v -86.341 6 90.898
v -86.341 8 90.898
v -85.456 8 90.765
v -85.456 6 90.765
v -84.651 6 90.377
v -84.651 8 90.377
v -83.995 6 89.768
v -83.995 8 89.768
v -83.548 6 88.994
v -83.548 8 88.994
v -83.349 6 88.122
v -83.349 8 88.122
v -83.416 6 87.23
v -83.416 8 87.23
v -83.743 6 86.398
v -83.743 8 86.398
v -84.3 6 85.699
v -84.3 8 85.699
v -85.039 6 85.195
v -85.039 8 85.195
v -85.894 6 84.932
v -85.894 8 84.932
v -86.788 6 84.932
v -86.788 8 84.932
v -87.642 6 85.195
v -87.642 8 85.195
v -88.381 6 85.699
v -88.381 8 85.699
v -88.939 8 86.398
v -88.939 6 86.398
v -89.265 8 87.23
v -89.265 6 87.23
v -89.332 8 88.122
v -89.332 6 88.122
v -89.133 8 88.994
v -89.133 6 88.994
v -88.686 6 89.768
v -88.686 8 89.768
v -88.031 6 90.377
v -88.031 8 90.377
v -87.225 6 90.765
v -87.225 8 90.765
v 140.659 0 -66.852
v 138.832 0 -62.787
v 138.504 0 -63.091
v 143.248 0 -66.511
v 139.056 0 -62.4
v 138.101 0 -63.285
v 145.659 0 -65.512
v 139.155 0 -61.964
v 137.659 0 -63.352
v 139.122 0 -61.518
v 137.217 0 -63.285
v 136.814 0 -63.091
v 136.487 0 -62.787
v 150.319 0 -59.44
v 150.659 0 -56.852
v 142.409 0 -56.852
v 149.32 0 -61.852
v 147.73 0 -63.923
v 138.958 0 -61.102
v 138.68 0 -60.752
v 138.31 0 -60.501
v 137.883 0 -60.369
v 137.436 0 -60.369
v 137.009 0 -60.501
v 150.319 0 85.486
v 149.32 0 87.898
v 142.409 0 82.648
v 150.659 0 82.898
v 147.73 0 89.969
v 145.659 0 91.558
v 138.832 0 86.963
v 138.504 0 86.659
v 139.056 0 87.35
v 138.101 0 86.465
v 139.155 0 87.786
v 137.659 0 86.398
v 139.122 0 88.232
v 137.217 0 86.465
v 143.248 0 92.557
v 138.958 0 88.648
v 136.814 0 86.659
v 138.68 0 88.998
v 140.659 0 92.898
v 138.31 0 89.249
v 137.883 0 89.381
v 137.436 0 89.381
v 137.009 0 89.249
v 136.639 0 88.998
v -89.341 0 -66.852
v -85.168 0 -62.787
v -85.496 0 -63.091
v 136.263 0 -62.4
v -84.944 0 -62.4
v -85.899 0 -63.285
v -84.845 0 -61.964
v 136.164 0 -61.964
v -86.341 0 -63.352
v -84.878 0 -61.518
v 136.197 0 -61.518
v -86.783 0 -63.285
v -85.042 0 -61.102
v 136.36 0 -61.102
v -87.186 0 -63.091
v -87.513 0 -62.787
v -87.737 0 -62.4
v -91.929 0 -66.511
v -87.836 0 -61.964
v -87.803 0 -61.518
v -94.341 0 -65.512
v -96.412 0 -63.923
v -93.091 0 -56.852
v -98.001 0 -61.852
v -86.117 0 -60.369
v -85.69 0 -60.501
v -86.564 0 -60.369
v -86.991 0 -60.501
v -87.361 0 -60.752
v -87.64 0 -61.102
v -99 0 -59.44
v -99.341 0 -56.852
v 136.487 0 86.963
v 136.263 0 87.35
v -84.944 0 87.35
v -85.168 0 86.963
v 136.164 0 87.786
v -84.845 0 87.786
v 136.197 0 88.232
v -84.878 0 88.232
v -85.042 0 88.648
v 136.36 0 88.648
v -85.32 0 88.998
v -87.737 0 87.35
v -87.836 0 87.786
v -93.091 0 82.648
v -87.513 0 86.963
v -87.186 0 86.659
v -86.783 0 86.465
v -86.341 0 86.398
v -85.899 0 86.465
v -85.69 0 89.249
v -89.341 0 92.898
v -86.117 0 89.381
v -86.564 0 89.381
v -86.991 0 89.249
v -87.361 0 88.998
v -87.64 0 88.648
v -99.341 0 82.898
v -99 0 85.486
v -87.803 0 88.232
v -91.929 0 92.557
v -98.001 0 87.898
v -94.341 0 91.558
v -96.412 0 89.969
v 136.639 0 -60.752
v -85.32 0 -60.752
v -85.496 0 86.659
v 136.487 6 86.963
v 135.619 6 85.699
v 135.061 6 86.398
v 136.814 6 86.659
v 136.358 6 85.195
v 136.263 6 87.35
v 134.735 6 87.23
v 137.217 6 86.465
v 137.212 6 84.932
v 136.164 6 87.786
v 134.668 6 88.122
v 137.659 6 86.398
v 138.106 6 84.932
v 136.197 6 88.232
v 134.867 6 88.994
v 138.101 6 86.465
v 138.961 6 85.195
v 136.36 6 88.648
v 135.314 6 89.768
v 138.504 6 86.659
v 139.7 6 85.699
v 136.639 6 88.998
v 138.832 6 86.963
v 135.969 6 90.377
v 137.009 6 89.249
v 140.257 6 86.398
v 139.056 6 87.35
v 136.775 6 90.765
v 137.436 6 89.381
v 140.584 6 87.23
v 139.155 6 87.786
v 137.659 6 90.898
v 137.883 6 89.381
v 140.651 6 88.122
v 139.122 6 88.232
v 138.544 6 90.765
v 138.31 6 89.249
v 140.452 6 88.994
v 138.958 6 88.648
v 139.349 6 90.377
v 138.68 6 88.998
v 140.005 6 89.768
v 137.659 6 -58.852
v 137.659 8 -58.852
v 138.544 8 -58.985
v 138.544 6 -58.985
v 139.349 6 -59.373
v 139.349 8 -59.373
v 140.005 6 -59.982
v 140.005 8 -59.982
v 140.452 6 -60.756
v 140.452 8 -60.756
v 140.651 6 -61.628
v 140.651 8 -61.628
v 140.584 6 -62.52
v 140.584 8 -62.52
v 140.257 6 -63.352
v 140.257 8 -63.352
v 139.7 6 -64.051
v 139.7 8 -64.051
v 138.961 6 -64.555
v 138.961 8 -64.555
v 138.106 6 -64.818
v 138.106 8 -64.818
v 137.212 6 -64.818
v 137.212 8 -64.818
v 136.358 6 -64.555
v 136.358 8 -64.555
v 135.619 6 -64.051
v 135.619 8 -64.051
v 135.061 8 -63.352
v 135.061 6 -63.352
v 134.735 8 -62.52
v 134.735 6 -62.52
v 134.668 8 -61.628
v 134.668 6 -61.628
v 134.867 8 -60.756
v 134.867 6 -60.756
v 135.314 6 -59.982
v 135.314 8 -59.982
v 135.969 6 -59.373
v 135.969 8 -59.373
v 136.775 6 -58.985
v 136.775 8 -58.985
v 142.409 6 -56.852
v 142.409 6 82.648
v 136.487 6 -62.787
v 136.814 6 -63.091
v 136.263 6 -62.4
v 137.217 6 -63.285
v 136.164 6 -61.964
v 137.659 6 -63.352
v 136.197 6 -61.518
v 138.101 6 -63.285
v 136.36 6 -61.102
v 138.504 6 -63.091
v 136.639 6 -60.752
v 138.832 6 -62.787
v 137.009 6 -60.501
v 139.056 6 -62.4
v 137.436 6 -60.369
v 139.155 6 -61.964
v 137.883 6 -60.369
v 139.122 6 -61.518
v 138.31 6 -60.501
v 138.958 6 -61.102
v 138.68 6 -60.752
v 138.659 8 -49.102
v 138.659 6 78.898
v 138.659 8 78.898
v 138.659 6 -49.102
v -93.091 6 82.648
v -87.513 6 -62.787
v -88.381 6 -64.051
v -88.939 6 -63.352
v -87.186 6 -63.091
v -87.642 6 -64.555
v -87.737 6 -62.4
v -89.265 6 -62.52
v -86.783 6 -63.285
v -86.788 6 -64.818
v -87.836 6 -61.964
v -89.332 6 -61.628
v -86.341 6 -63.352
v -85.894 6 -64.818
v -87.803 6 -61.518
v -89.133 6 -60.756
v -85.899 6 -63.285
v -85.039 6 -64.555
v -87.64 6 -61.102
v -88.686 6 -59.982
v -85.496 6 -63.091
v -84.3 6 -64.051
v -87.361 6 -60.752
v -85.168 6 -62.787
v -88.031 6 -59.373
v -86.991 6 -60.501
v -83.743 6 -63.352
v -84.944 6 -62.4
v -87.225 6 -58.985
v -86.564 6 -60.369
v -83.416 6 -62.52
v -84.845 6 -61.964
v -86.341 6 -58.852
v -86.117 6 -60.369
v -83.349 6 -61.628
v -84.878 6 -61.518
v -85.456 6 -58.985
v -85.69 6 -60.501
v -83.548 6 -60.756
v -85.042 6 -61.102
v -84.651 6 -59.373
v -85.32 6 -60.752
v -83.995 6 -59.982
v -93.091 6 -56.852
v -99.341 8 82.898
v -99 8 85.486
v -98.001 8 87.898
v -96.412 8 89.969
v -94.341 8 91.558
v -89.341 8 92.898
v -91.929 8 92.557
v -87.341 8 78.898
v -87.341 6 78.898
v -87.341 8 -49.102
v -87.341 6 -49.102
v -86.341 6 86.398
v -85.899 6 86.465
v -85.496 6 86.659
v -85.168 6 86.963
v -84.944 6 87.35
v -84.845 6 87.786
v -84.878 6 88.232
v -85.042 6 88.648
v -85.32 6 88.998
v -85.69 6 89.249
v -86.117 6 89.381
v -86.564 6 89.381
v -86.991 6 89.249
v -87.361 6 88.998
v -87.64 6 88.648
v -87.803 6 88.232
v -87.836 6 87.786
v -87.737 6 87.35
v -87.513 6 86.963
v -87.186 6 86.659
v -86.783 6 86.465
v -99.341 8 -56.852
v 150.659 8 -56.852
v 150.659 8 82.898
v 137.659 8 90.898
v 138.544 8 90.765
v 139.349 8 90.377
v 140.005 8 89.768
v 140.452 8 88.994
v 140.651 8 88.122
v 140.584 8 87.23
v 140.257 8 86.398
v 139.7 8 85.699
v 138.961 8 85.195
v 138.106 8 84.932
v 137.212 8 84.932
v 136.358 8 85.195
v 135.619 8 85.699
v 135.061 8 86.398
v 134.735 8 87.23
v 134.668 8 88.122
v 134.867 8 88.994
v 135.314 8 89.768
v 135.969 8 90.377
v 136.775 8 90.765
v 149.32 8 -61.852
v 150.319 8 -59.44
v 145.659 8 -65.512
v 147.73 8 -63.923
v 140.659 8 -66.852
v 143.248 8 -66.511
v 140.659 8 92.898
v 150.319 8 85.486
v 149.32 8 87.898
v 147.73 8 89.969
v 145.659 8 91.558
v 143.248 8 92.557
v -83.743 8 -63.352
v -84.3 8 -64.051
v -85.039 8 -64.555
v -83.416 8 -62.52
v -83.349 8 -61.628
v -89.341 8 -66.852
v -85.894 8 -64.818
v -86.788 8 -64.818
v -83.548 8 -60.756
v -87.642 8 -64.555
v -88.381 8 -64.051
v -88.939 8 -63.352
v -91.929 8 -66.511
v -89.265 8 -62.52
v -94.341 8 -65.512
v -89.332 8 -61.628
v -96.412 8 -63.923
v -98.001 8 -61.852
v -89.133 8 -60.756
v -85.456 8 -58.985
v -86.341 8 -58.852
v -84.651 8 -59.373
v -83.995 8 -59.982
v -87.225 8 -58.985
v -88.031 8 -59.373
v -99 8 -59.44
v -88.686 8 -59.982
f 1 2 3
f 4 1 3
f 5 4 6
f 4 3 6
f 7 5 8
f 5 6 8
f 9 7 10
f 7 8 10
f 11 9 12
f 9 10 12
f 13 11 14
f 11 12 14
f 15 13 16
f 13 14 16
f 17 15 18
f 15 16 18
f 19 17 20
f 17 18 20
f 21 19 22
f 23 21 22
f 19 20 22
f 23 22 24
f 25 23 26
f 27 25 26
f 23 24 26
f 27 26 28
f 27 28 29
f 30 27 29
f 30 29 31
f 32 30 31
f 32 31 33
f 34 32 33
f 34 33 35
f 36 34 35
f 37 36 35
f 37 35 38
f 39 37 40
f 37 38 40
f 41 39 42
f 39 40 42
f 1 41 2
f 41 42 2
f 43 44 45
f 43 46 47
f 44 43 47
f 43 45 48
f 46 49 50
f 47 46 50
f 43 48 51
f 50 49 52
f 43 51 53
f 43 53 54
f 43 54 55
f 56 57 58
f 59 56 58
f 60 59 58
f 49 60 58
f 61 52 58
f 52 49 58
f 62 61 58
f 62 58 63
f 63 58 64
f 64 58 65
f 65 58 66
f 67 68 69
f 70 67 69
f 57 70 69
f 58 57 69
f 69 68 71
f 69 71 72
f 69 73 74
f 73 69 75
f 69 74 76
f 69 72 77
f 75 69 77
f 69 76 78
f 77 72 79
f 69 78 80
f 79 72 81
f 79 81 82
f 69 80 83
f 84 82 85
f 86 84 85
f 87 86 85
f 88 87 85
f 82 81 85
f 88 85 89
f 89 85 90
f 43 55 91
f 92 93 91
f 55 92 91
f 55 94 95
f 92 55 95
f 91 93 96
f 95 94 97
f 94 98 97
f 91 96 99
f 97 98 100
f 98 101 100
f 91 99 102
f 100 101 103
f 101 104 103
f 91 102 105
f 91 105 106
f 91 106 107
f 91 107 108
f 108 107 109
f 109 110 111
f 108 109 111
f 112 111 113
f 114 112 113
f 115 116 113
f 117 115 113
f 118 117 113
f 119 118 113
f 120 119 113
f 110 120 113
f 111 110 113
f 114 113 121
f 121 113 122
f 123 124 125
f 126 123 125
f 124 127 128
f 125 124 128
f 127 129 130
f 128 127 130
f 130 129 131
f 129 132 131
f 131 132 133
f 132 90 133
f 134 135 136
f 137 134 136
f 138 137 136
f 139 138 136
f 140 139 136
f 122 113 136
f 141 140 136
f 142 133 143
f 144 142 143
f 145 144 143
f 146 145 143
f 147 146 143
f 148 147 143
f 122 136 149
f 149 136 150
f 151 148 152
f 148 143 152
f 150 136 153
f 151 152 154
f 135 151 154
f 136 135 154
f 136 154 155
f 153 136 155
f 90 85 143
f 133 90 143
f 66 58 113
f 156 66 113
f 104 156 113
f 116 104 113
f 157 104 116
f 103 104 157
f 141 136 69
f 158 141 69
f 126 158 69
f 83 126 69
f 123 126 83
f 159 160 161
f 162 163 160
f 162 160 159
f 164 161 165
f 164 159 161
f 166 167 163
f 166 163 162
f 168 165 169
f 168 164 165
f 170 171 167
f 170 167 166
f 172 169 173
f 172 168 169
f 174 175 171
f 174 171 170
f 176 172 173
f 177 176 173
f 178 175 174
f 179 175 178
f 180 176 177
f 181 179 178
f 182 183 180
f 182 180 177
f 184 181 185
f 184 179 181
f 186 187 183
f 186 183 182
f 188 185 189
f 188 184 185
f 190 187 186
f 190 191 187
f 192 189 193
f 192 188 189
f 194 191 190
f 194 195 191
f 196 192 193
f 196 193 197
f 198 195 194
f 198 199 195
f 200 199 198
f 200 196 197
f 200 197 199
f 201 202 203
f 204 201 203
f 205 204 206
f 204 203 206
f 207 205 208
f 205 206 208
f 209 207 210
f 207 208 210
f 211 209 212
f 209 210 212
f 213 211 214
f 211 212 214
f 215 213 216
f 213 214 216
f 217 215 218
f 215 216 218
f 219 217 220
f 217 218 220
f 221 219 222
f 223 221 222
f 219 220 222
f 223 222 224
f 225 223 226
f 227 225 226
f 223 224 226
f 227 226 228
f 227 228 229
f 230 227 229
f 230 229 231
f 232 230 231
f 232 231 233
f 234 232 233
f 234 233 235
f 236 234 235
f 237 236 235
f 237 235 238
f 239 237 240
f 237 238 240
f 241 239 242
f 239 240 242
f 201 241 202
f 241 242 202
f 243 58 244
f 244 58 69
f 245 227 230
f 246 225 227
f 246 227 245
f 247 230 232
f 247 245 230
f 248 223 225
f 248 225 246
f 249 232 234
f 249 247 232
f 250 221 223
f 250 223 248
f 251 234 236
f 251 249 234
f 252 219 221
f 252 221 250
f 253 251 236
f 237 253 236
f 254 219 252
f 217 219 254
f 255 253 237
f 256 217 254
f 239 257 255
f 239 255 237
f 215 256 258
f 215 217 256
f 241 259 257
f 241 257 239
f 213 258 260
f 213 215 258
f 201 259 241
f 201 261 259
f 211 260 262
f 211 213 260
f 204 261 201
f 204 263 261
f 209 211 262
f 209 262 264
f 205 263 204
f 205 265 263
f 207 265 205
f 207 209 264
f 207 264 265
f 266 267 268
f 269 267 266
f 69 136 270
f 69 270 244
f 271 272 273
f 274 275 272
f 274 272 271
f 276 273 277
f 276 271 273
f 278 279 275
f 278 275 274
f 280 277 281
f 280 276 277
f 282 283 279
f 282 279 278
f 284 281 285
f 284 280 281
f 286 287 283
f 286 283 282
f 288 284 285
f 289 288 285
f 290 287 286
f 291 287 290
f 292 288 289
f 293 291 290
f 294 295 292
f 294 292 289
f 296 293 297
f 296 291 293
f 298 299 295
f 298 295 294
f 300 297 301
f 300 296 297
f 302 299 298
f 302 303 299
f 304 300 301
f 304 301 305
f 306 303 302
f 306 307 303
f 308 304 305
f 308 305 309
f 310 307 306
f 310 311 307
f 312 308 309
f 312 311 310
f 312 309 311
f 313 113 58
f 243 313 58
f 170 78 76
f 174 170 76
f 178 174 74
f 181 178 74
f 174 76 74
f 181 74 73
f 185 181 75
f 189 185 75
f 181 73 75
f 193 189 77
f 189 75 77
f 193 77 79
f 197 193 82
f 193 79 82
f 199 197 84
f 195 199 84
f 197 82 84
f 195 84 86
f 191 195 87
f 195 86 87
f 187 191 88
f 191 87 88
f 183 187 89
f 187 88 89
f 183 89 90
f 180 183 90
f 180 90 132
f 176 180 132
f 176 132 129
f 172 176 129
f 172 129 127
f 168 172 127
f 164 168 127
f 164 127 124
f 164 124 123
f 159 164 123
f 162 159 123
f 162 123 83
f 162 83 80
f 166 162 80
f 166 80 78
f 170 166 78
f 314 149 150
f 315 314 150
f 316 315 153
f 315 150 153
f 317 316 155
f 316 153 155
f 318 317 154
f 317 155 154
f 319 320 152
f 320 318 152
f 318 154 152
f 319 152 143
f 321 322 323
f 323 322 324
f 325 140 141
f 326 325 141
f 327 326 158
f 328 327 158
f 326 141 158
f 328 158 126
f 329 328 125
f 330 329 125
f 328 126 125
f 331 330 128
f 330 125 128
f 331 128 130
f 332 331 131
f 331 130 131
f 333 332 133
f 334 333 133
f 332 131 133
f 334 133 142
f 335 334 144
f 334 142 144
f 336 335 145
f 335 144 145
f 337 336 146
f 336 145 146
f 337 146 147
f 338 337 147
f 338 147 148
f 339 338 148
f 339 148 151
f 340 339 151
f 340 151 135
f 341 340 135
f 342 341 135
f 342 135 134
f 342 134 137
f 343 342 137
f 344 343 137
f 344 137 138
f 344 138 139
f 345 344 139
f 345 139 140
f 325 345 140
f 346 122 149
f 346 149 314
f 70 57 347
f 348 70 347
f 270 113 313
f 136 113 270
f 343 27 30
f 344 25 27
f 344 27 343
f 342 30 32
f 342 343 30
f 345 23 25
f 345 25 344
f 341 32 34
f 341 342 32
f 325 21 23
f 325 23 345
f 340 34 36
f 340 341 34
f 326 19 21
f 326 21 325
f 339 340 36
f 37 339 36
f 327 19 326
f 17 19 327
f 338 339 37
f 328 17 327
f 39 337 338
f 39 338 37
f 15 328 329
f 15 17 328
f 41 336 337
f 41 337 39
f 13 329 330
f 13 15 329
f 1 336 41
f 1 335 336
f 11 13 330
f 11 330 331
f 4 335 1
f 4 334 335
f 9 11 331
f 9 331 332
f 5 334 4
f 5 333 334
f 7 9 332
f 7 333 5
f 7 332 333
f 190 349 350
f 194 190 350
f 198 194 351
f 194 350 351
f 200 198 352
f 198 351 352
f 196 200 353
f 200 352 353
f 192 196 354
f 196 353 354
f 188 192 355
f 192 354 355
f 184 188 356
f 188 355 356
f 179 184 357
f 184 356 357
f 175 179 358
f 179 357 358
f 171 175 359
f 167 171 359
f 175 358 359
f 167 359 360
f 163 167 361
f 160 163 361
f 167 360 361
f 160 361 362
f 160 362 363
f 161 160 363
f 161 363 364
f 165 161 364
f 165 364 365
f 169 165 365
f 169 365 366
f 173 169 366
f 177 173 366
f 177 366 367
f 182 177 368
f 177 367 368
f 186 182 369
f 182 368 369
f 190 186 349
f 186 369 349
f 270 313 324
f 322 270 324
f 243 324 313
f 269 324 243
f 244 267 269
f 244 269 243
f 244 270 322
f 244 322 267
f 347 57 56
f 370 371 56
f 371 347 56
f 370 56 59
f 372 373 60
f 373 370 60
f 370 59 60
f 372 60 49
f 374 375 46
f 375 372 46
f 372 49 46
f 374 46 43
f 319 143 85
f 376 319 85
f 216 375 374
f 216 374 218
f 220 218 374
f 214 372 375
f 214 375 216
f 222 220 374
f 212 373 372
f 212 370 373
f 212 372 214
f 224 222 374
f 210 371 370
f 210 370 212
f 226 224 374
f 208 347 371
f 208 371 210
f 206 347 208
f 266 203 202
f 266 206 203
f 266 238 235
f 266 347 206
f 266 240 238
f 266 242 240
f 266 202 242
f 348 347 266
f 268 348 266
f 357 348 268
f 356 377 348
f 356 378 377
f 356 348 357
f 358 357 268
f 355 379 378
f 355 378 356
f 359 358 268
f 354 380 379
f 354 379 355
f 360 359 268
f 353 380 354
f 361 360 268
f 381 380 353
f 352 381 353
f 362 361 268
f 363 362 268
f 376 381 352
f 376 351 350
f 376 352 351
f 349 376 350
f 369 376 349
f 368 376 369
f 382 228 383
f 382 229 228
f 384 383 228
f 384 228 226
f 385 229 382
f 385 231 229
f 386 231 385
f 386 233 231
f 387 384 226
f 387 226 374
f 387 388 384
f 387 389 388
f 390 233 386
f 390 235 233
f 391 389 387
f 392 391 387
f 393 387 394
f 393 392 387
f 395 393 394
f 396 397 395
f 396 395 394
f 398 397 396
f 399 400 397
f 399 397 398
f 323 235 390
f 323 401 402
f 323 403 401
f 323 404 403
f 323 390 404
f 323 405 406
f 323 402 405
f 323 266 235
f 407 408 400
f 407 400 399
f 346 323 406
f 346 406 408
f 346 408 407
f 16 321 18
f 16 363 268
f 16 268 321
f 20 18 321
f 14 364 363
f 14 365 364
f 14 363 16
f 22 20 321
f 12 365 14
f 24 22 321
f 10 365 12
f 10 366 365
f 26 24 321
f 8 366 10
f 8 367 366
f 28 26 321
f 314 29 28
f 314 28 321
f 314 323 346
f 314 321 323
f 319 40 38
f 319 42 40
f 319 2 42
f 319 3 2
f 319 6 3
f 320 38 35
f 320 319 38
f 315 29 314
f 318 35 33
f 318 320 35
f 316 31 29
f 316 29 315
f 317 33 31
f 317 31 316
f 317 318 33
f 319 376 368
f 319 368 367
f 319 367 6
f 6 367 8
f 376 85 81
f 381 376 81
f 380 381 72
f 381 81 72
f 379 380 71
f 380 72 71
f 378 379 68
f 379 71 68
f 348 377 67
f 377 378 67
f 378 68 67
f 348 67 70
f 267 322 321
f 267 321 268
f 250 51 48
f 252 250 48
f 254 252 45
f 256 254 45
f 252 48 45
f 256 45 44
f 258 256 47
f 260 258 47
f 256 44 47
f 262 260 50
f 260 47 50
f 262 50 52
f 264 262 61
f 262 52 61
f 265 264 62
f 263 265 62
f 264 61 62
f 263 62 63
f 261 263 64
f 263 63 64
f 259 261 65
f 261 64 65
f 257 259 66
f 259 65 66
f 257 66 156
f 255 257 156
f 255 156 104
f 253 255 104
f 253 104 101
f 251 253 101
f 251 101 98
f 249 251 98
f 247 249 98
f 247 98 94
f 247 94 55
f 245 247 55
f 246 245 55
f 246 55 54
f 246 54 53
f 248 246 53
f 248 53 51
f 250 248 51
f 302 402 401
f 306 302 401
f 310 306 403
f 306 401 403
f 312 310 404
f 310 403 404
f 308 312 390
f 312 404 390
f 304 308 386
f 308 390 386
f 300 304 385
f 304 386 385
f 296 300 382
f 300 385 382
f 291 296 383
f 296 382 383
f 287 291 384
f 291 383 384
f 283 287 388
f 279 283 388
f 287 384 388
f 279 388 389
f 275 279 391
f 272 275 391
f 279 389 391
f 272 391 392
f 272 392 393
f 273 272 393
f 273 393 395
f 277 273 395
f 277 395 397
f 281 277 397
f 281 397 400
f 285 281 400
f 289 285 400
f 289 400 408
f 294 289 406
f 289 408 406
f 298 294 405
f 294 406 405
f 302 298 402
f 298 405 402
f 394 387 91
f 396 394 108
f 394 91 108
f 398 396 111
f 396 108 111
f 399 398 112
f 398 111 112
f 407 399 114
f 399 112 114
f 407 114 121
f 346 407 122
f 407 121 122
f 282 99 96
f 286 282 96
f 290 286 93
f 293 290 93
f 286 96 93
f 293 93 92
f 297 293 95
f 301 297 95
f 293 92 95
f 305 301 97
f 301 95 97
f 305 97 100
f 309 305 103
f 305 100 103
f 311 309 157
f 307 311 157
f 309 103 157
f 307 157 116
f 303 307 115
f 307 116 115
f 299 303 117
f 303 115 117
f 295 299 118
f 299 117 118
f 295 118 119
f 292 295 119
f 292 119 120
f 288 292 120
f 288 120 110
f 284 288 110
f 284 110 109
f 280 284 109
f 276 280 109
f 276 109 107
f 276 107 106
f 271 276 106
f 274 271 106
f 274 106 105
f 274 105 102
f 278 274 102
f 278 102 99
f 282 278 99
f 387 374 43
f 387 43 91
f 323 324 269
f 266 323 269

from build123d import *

# Parameters (mm, degrees)
SKETCH_1_W          = 250
SKETCH_1_H          = 156
SKETCH_1_W_2        = 226
SKETCH_1_H_2        = 128
EXTRUDE_1_DEPTH     = 8
SKETCH_2_W          = 235.5
SKETCH_2_H          = 139.5
CUT_EXTRUDE_3_DEPTH = 6
SKETCH_11_W         = 250
SKETCH_11_H         = 8
EXTRUDE_3_DEPTH     = 3.75
CUT_EXTRUDE_4_DEPTH = 10
SKETCH_13_R         = 1.5
CUT_EXTRUDE_5_DEPTH = 10
SKETCH_14_R         = 3
CUT_EXTRUDE_6_DEPTH = 2


with BuildPart() as part:
    # 草图1 → 凸台-拉伸1 (new body)
    with BuildSketch(Plane(origin=(0, 0, 0), x_dir=(1, 0, 0), z_dir=(0, 1, 0))):
        with Locations((25.659327926, -14.898030127)):
            Rectangle(SKETCH_1_W, SKETCH_1_H)
        with Locations((25.659327926, -14.898030127)):
            Rectangle(SKETCH_1_W_2, SKETCH_1_H_2, mode=Mode.SUBTRACT)
    extrude(amount=EXTRUDE_1_DEPTH)

    # 草图2 → 切除-拉伸3 (cut)
    with BuildSketch(Plane.XZ):
        with Locations((24.659327926, 12.898030127)):
            Rectangle(SKETCH_2_W, SKETCH_2_H)
    extrude(amount=-CUT_EXTRUDE_3_DEPTH, mode=Mode.SUBTRACT)

    # 草图11 → 凸台-拉伸3 (add)
    with BuildSketch(Plane(origin=(0, 0, -63.101969873), x_dir=(-1, 0, 0), z_dir=(0, 0, -1))):
        with Locations((-25.659327926, 4)):
            Rectangle(SKETCH_11_W, SKETCH_11_H)
    extrude(amount=EXTRUDE_3_DEPTH)

    # 草图12 → 切除-拉伸4 (cut)
    with BuildSketch(Plane.XZ):
        with BuildLine():
            Line((-89.340672074, 92.898030127), (-99.340672074, 92.898030127))
            Line((-99.340672074, 92.898030127), (-99.340672074, 82.898030127))
            ThreePointArc((-99.340672074, 82.898030127), (-96.411739886, 89.969097939), (-89.340672074, 92.898030127))
        make_face()
        with BuildLine():
            Line((-99.340672074, -56.851969873), (-99.340672074, -66.851969873))
            Line((-99.340672074, -66.851969873), (-89.340672074, -66.851969873))
            ThreePointArc((-89.340672074, -66.851969873), (-96.411739886, -63.923037684), (-99.340672074, -56.851969873))
        make_face()
        with BuildLine():
            Line((140.659327926, -66.851969873), (150.659327926, -66.851969873))
            Line((150.659327926, -66.851969873), (150.659327926, -56.851969873))
            ThreePointArc((150.659327926, -56.851969873), (147.730395738, -63.923037684), (140.659327926, -66.851969873))
        make_face()
        with BuildLine():
            Line((150.659327926, 82.898030127), (150.659327926, 92.898030127))
            Line((150.659327926, 92.898030127), (140.659327926, 92.898030127))
            ThreePointArc((140.659327926, 92.898030127), (147.730395738, 89.969097939), (150.659327926, 82.898030127))
        make_face()
    extrude(amount=-CUT_EXTRUDE_4_DEPTH, mode=Mode.SUBTRACT)

    # 草图13 → 切除-拉伸5 (cut)
    with BuildSketch(Plane.XZ):
        with Locations(Location((-86.340672074, 87.898030127, 0), (0, 0, 270))):
            Circle(SKETCH_13_R)
        with Locations(Location((137.659327926, 87.898030127, 0), (0, 0, 270))):
            Circle(SKETCH_13_R)
        with Locations(Location((137.659327926, -61.851969873, 0), (0, 0, 270))):
            Circle(SKETCH_13_R)
        with Locations(Location((-86.340672074, -61.851969873, 0), (0, 0, 270))):
            Circle(SKETCH_13_R)
    extrude(amount=-CUT_EXTRUDE_5_DEPTH, mode=Mode.SUBTRACT)

    # 草图14 → 切除-拉伸6 (cut)
    with BuildSketch(Plane(origin=(0, 8, 0), x_dir=(1, 0, 0), z_dir=(0, 1, 0))):
        with Locations(Location((-86.340672074, 61.851969873, 0), (0, 0, 270))):
            Circle(SKETCH_14_R)
        with Locations(Location((137.659327926, 61.851969873, 0), (0, 0, 270))):
            Circle(SKETCH_14_R)
        with Locations(Location((137.659327926, -87.898030127, 0), (0, 0, 270))):
            Circle(SKETCH_14_R)
        with Locations(Location((-86.340672074, -87.898030127, 0), (0, 0, 270))):
            Circle(SKETCH_14_R)
    extrude(amount=-CUT_EXTRUDE_6_DEPTH, mode=Mode.SUBTRACT)


solid = part.part
